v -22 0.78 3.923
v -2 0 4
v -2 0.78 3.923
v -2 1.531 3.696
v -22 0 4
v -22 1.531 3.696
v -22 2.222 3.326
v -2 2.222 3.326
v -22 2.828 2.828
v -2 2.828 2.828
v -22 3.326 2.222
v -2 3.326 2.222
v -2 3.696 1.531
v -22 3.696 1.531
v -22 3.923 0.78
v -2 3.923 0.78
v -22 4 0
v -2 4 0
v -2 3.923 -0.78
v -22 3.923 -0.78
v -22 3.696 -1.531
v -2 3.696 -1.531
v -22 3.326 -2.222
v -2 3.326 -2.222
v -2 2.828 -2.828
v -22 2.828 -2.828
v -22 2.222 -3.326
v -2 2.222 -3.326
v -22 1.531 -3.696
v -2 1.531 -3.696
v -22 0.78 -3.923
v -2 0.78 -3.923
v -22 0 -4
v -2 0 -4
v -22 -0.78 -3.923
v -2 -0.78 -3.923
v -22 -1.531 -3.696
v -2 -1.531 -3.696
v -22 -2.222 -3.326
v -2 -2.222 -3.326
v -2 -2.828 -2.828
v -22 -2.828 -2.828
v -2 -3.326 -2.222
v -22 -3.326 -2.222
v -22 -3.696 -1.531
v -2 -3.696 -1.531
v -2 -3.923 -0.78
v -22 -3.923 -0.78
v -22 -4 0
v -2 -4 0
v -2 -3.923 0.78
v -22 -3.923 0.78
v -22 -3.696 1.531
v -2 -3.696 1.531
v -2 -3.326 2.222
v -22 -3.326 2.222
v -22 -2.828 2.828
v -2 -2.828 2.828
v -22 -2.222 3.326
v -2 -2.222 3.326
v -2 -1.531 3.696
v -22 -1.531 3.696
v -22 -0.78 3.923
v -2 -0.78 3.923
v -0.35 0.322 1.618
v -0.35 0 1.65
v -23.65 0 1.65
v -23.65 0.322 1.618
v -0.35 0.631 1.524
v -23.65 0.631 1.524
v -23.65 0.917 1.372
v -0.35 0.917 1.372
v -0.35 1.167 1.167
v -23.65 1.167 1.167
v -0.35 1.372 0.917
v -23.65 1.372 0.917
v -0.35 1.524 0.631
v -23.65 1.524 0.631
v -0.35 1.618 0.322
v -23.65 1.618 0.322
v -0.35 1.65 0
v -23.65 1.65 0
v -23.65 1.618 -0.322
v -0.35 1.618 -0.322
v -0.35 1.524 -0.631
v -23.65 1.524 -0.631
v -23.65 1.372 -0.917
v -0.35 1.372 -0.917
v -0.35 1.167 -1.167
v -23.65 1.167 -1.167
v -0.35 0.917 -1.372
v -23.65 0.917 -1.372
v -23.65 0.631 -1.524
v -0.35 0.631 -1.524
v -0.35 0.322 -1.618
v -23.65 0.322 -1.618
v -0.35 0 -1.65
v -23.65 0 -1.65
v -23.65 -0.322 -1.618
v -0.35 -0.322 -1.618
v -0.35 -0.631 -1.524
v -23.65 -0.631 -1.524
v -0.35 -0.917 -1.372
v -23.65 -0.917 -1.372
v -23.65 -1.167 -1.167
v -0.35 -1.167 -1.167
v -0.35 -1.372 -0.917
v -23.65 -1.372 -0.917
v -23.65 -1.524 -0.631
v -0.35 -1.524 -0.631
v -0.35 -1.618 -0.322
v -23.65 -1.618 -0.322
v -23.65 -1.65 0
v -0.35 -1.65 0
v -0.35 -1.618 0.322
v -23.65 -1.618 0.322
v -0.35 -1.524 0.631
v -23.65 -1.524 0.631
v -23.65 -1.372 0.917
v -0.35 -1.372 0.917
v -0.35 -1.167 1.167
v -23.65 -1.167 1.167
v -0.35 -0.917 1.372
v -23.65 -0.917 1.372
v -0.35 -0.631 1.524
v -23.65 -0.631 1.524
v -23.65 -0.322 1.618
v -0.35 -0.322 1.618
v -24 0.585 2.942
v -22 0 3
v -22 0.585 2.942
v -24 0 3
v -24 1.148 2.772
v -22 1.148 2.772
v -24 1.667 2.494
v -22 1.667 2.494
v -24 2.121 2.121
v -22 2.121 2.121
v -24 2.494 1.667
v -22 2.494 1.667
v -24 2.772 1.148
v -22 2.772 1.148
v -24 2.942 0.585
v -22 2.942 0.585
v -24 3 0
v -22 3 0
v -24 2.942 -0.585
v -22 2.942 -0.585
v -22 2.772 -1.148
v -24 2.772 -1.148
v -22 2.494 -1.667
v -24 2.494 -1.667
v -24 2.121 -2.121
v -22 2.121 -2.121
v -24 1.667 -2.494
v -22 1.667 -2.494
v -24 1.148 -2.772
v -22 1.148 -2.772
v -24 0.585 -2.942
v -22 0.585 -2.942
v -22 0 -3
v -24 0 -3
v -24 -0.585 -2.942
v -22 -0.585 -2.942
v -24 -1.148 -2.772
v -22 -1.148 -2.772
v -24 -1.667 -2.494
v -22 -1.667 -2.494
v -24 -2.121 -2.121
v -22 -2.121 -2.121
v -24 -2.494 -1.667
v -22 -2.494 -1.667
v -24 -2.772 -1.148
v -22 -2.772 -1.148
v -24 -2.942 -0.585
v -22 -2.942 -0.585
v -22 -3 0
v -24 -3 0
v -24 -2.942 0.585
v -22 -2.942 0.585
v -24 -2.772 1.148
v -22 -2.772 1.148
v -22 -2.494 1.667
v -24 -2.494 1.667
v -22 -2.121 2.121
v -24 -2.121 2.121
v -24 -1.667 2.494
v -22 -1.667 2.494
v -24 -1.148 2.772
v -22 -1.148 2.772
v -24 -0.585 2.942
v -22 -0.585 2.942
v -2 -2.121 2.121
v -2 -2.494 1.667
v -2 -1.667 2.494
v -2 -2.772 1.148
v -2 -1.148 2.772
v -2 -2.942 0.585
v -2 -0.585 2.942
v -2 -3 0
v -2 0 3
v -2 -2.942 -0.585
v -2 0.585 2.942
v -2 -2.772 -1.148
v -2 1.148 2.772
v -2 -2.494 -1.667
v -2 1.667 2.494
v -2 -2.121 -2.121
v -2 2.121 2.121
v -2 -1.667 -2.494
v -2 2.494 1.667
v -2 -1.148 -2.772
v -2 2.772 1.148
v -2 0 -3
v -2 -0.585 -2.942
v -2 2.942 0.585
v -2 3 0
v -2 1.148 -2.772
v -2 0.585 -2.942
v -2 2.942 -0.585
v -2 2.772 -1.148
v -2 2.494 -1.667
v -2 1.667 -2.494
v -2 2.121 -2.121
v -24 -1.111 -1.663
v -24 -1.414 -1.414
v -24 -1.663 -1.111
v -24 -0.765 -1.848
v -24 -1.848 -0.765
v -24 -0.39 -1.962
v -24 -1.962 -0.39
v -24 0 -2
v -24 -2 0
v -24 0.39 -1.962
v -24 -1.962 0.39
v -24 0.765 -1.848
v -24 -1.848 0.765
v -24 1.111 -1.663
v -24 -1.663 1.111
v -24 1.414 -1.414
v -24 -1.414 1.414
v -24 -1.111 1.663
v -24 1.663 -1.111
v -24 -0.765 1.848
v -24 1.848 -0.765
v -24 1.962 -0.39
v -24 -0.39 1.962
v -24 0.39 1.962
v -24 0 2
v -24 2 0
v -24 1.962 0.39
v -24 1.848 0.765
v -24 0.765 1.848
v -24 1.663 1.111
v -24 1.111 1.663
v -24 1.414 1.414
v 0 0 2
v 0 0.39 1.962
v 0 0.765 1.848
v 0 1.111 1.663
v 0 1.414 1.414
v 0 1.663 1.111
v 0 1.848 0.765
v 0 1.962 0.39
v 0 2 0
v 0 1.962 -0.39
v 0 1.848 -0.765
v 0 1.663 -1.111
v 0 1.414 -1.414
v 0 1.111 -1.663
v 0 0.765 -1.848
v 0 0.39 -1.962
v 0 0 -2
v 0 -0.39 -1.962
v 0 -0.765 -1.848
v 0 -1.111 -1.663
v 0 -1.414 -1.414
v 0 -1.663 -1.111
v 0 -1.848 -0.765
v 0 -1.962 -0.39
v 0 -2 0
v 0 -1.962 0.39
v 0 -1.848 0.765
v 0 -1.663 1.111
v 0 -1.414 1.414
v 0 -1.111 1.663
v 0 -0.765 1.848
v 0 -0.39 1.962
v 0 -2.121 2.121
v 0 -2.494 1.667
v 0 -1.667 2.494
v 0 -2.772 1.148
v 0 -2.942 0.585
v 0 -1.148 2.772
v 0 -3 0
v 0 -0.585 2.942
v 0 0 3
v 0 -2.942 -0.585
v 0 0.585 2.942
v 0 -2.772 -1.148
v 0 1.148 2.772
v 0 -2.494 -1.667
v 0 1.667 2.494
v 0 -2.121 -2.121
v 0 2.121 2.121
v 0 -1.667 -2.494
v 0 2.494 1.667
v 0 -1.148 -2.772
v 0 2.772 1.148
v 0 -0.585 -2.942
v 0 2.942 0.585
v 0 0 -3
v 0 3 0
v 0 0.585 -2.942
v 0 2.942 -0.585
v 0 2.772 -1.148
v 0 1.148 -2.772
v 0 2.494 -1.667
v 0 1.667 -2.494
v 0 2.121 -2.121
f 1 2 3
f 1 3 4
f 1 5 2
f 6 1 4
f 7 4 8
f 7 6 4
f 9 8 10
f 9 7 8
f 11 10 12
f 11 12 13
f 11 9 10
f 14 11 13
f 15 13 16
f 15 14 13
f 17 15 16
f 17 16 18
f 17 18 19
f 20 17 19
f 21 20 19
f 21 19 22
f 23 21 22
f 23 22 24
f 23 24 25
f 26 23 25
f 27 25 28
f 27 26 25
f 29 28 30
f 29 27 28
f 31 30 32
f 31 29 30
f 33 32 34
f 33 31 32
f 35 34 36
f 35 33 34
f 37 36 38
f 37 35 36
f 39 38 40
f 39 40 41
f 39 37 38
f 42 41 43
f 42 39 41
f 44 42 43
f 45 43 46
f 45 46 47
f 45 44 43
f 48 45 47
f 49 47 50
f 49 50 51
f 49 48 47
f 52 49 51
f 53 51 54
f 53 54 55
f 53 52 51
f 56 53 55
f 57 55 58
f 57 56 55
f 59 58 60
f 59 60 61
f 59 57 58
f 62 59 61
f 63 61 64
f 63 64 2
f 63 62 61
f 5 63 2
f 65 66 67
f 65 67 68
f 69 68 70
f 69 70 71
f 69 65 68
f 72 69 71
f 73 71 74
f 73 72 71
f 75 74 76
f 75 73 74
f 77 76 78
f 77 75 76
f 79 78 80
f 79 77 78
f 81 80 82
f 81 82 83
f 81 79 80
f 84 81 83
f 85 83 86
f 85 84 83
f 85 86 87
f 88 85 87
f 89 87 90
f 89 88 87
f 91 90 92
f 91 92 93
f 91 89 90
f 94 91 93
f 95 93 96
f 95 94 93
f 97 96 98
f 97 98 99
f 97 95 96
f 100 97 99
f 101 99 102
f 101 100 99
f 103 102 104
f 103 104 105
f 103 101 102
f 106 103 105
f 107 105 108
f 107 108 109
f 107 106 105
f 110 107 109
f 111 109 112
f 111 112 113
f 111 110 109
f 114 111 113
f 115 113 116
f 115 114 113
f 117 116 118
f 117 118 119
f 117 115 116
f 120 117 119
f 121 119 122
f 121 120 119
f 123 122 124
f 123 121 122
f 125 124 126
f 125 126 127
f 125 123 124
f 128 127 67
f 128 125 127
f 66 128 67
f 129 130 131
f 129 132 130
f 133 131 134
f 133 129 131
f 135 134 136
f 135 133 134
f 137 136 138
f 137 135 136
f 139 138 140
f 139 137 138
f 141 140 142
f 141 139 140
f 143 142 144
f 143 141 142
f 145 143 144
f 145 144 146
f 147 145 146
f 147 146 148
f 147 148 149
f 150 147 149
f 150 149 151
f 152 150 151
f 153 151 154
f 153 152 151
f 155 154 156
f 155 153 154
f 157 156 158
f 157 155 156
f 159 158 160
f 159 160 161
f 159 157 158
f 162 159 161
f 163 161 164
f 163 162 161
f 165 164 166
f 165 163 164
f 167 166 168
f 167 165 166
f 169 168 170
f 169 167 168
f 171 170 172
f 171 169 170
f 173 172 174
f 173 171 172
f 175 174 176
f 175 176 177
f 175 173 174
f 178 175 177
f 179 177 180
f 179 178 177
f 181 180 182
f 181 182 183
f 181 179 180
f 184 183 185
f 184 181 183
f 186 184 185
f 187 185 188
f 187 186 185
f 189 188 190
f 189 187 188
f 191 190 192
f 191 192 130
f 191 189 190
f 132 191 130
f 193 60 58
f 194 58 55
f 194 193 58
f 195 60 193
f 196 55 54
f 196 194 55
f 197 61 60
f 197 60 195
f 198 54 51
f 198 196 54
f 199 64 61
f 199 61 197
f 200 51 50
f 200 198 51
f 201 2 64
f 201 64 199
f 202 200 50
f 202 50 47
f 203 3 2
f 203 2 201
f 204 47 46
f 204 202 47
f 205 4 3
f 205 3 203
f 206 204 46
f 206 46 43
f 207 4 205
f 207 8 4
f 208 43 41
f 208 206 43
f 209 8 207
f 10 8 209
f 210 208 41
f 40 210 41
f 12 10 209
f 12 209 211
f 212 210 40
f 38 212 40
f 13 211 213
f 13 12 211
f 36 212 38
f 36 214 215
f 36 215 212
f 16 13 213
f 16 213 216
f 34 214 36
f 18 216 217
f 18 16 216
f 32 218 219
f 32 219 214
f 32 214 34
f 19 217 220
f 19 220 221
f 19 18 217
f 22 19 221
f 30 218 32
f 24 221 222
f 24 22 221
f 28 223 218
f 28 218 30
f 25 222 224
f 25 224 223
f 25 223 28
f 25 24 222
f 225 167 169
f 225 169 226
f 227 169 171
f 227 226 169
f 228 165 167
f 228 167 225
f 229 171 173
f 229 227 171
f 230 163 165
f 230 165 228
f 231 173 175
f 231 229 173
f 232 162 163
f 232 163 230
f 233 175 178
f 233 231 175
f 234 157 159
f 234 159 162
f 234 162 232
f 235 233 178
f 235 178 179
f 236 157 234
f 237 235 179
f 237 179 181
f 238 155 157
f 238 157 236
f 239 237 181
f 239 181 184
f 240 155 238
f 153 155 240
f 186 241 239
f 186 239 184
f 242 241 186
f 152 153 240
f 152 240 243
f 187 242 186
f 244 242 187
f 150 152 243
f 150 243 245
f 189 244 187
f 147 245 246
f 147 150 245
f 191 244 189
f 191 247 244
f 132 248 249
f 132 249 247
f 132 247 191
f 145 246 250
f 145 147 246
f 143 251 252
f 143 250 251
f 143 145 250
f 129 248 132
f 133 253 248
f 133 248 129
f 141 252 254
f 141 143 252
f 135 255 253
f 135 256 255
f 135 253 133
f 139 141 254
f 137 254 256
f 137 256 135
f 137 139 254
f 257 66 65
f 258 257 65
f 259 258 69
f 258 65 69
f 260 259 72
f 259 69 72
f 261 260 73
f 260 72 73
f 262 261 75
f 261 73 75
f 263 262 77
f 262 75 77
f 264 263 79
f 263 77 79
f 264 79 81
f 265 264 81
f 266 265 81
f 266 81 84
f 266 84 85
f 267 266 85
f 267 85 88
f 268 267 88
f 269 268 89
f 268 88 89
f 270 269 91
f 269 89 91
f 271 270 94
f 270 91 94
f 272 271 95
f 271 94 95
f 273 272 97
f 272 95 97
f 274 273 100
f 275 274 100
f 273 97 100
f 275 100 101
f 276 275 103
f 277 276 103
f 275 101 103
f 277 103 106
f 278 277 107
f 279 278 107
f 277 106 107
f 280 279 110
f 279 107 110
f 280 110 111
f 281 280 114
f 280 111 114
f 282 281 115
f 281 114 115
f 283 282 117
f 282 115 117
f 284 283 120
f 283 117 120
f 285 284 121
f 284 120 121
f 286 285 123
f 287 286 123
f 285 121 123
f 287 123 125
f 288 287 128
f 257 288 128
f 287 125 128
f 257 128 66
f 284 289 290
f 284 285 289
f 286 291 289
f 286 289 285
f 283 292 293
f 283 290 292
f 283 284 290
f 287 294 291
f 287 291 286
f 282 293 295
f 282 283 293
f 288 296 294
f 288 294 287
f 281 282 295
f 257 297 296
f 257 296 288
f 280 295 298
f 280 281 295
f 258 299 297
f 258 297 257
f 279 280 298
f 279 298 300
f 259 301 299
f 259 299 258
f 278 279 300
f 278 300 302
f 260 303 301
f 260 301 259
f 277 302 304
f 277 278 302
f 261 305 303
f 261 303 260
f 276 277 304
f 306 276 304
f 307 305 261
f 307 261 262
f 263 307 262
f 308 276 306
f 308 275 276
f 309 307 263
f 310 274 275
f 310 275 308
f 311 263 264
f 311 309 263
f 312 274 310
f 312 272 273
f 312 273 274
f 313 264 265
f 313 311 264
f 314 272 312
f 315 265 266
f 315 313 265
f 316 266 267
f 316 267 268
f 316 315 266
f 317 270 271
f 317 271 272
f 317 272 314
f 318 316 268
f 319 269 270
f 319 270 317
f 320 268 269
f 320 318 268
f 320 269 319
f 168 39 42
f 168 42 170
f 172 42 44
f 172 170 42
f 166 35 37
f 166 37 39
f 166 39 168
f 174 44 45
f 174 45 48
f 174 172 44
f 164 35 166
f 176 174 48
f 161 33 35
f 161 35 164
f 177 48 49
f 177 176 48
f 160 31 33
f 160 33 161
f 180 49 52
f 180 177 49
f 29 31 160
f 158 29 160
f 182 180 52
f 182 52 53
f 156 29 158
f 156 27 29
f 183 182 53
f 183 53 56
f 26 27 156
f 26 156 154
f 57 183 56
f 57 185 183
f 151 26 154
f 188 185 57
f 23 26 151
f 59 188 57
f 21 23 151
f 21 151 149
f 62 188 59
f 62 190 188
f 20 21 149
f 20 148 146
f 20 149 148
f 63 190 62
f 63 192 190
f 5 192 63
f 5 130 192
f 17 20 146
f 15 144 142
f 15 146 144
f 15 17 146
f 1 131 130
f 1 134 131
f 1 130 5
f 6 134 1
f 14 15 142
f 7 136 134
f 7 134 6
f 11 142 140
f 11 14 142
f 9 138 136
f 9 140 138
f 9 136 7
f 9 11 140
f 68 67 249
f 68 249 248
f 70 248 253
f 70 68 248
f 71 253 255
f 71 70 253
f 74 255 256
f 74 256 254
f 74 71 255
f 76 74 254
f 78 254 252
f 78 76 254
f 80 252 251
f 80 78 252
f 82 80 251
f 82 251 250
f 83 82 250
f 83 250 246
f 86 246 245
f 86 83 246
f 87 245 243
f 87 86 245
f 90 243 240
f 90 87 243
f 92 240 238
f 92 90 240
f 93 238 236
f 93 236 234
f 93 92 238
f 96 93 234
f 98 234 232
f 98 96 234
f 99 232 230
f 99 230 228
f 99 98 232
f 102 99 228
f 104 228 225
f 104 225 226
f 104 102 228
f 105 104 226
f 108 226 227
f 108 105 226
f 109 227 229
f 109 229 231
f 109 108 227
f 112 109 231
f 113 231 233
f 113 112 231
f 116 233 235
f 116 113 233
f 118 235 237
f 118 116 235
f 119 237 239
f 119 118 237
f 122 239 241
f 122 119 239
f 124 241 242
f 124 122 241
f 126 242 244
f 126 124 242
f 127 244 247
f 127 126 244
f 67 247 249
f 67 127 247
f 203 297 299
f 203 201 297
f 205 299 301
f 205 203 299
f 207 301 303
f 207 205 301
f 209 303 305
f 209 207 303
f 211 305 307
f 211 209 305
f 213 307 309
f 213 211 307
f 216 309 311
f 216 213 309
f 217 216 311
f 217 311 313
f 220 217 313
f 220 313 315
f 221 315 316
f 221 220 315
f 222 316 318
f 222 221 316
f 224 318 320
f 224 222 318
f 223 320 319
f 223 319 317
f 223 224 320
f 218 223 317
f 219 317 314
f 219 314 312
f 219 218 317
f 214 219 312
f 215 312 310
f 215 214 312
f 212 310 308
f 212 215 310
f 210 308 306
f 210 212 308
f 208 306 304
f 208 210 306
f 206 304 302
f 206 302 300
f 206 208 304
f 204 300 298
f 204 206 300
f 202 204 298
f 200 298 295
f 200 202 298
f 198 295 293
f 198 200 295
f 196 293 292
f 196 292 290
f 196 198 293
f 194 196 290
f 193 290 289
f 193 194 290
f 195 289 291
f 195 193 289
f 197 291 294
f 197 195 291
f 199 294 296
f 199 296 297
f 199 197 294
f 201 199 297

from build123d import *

# Parameters (mm, degrees)
F2_SIZE = 0.35


with BuildPart() as f1:
    # F0 (on Front) → F1 (revolve)
    with BuildSketch(Plane.XZ):
        Polygon((0, 1.65), (0, 3), (-2, 3), (-2, 4), (-22, 4), (-22, 3), (-24, 3), (-24, 1.65), align=None)
    revolve(axis=Axis((-12, 0, 0), (-1, 0, 0)))

    # F2
    f2_edges = [f1.edges().sort_by_distance(p)[0] for p in [
        (-24, 0, -1.65),
        (0, 0, -1.65),
    ]]
    chamfer(f2_edges, length=F2_SIZE)


solid = f1.part
